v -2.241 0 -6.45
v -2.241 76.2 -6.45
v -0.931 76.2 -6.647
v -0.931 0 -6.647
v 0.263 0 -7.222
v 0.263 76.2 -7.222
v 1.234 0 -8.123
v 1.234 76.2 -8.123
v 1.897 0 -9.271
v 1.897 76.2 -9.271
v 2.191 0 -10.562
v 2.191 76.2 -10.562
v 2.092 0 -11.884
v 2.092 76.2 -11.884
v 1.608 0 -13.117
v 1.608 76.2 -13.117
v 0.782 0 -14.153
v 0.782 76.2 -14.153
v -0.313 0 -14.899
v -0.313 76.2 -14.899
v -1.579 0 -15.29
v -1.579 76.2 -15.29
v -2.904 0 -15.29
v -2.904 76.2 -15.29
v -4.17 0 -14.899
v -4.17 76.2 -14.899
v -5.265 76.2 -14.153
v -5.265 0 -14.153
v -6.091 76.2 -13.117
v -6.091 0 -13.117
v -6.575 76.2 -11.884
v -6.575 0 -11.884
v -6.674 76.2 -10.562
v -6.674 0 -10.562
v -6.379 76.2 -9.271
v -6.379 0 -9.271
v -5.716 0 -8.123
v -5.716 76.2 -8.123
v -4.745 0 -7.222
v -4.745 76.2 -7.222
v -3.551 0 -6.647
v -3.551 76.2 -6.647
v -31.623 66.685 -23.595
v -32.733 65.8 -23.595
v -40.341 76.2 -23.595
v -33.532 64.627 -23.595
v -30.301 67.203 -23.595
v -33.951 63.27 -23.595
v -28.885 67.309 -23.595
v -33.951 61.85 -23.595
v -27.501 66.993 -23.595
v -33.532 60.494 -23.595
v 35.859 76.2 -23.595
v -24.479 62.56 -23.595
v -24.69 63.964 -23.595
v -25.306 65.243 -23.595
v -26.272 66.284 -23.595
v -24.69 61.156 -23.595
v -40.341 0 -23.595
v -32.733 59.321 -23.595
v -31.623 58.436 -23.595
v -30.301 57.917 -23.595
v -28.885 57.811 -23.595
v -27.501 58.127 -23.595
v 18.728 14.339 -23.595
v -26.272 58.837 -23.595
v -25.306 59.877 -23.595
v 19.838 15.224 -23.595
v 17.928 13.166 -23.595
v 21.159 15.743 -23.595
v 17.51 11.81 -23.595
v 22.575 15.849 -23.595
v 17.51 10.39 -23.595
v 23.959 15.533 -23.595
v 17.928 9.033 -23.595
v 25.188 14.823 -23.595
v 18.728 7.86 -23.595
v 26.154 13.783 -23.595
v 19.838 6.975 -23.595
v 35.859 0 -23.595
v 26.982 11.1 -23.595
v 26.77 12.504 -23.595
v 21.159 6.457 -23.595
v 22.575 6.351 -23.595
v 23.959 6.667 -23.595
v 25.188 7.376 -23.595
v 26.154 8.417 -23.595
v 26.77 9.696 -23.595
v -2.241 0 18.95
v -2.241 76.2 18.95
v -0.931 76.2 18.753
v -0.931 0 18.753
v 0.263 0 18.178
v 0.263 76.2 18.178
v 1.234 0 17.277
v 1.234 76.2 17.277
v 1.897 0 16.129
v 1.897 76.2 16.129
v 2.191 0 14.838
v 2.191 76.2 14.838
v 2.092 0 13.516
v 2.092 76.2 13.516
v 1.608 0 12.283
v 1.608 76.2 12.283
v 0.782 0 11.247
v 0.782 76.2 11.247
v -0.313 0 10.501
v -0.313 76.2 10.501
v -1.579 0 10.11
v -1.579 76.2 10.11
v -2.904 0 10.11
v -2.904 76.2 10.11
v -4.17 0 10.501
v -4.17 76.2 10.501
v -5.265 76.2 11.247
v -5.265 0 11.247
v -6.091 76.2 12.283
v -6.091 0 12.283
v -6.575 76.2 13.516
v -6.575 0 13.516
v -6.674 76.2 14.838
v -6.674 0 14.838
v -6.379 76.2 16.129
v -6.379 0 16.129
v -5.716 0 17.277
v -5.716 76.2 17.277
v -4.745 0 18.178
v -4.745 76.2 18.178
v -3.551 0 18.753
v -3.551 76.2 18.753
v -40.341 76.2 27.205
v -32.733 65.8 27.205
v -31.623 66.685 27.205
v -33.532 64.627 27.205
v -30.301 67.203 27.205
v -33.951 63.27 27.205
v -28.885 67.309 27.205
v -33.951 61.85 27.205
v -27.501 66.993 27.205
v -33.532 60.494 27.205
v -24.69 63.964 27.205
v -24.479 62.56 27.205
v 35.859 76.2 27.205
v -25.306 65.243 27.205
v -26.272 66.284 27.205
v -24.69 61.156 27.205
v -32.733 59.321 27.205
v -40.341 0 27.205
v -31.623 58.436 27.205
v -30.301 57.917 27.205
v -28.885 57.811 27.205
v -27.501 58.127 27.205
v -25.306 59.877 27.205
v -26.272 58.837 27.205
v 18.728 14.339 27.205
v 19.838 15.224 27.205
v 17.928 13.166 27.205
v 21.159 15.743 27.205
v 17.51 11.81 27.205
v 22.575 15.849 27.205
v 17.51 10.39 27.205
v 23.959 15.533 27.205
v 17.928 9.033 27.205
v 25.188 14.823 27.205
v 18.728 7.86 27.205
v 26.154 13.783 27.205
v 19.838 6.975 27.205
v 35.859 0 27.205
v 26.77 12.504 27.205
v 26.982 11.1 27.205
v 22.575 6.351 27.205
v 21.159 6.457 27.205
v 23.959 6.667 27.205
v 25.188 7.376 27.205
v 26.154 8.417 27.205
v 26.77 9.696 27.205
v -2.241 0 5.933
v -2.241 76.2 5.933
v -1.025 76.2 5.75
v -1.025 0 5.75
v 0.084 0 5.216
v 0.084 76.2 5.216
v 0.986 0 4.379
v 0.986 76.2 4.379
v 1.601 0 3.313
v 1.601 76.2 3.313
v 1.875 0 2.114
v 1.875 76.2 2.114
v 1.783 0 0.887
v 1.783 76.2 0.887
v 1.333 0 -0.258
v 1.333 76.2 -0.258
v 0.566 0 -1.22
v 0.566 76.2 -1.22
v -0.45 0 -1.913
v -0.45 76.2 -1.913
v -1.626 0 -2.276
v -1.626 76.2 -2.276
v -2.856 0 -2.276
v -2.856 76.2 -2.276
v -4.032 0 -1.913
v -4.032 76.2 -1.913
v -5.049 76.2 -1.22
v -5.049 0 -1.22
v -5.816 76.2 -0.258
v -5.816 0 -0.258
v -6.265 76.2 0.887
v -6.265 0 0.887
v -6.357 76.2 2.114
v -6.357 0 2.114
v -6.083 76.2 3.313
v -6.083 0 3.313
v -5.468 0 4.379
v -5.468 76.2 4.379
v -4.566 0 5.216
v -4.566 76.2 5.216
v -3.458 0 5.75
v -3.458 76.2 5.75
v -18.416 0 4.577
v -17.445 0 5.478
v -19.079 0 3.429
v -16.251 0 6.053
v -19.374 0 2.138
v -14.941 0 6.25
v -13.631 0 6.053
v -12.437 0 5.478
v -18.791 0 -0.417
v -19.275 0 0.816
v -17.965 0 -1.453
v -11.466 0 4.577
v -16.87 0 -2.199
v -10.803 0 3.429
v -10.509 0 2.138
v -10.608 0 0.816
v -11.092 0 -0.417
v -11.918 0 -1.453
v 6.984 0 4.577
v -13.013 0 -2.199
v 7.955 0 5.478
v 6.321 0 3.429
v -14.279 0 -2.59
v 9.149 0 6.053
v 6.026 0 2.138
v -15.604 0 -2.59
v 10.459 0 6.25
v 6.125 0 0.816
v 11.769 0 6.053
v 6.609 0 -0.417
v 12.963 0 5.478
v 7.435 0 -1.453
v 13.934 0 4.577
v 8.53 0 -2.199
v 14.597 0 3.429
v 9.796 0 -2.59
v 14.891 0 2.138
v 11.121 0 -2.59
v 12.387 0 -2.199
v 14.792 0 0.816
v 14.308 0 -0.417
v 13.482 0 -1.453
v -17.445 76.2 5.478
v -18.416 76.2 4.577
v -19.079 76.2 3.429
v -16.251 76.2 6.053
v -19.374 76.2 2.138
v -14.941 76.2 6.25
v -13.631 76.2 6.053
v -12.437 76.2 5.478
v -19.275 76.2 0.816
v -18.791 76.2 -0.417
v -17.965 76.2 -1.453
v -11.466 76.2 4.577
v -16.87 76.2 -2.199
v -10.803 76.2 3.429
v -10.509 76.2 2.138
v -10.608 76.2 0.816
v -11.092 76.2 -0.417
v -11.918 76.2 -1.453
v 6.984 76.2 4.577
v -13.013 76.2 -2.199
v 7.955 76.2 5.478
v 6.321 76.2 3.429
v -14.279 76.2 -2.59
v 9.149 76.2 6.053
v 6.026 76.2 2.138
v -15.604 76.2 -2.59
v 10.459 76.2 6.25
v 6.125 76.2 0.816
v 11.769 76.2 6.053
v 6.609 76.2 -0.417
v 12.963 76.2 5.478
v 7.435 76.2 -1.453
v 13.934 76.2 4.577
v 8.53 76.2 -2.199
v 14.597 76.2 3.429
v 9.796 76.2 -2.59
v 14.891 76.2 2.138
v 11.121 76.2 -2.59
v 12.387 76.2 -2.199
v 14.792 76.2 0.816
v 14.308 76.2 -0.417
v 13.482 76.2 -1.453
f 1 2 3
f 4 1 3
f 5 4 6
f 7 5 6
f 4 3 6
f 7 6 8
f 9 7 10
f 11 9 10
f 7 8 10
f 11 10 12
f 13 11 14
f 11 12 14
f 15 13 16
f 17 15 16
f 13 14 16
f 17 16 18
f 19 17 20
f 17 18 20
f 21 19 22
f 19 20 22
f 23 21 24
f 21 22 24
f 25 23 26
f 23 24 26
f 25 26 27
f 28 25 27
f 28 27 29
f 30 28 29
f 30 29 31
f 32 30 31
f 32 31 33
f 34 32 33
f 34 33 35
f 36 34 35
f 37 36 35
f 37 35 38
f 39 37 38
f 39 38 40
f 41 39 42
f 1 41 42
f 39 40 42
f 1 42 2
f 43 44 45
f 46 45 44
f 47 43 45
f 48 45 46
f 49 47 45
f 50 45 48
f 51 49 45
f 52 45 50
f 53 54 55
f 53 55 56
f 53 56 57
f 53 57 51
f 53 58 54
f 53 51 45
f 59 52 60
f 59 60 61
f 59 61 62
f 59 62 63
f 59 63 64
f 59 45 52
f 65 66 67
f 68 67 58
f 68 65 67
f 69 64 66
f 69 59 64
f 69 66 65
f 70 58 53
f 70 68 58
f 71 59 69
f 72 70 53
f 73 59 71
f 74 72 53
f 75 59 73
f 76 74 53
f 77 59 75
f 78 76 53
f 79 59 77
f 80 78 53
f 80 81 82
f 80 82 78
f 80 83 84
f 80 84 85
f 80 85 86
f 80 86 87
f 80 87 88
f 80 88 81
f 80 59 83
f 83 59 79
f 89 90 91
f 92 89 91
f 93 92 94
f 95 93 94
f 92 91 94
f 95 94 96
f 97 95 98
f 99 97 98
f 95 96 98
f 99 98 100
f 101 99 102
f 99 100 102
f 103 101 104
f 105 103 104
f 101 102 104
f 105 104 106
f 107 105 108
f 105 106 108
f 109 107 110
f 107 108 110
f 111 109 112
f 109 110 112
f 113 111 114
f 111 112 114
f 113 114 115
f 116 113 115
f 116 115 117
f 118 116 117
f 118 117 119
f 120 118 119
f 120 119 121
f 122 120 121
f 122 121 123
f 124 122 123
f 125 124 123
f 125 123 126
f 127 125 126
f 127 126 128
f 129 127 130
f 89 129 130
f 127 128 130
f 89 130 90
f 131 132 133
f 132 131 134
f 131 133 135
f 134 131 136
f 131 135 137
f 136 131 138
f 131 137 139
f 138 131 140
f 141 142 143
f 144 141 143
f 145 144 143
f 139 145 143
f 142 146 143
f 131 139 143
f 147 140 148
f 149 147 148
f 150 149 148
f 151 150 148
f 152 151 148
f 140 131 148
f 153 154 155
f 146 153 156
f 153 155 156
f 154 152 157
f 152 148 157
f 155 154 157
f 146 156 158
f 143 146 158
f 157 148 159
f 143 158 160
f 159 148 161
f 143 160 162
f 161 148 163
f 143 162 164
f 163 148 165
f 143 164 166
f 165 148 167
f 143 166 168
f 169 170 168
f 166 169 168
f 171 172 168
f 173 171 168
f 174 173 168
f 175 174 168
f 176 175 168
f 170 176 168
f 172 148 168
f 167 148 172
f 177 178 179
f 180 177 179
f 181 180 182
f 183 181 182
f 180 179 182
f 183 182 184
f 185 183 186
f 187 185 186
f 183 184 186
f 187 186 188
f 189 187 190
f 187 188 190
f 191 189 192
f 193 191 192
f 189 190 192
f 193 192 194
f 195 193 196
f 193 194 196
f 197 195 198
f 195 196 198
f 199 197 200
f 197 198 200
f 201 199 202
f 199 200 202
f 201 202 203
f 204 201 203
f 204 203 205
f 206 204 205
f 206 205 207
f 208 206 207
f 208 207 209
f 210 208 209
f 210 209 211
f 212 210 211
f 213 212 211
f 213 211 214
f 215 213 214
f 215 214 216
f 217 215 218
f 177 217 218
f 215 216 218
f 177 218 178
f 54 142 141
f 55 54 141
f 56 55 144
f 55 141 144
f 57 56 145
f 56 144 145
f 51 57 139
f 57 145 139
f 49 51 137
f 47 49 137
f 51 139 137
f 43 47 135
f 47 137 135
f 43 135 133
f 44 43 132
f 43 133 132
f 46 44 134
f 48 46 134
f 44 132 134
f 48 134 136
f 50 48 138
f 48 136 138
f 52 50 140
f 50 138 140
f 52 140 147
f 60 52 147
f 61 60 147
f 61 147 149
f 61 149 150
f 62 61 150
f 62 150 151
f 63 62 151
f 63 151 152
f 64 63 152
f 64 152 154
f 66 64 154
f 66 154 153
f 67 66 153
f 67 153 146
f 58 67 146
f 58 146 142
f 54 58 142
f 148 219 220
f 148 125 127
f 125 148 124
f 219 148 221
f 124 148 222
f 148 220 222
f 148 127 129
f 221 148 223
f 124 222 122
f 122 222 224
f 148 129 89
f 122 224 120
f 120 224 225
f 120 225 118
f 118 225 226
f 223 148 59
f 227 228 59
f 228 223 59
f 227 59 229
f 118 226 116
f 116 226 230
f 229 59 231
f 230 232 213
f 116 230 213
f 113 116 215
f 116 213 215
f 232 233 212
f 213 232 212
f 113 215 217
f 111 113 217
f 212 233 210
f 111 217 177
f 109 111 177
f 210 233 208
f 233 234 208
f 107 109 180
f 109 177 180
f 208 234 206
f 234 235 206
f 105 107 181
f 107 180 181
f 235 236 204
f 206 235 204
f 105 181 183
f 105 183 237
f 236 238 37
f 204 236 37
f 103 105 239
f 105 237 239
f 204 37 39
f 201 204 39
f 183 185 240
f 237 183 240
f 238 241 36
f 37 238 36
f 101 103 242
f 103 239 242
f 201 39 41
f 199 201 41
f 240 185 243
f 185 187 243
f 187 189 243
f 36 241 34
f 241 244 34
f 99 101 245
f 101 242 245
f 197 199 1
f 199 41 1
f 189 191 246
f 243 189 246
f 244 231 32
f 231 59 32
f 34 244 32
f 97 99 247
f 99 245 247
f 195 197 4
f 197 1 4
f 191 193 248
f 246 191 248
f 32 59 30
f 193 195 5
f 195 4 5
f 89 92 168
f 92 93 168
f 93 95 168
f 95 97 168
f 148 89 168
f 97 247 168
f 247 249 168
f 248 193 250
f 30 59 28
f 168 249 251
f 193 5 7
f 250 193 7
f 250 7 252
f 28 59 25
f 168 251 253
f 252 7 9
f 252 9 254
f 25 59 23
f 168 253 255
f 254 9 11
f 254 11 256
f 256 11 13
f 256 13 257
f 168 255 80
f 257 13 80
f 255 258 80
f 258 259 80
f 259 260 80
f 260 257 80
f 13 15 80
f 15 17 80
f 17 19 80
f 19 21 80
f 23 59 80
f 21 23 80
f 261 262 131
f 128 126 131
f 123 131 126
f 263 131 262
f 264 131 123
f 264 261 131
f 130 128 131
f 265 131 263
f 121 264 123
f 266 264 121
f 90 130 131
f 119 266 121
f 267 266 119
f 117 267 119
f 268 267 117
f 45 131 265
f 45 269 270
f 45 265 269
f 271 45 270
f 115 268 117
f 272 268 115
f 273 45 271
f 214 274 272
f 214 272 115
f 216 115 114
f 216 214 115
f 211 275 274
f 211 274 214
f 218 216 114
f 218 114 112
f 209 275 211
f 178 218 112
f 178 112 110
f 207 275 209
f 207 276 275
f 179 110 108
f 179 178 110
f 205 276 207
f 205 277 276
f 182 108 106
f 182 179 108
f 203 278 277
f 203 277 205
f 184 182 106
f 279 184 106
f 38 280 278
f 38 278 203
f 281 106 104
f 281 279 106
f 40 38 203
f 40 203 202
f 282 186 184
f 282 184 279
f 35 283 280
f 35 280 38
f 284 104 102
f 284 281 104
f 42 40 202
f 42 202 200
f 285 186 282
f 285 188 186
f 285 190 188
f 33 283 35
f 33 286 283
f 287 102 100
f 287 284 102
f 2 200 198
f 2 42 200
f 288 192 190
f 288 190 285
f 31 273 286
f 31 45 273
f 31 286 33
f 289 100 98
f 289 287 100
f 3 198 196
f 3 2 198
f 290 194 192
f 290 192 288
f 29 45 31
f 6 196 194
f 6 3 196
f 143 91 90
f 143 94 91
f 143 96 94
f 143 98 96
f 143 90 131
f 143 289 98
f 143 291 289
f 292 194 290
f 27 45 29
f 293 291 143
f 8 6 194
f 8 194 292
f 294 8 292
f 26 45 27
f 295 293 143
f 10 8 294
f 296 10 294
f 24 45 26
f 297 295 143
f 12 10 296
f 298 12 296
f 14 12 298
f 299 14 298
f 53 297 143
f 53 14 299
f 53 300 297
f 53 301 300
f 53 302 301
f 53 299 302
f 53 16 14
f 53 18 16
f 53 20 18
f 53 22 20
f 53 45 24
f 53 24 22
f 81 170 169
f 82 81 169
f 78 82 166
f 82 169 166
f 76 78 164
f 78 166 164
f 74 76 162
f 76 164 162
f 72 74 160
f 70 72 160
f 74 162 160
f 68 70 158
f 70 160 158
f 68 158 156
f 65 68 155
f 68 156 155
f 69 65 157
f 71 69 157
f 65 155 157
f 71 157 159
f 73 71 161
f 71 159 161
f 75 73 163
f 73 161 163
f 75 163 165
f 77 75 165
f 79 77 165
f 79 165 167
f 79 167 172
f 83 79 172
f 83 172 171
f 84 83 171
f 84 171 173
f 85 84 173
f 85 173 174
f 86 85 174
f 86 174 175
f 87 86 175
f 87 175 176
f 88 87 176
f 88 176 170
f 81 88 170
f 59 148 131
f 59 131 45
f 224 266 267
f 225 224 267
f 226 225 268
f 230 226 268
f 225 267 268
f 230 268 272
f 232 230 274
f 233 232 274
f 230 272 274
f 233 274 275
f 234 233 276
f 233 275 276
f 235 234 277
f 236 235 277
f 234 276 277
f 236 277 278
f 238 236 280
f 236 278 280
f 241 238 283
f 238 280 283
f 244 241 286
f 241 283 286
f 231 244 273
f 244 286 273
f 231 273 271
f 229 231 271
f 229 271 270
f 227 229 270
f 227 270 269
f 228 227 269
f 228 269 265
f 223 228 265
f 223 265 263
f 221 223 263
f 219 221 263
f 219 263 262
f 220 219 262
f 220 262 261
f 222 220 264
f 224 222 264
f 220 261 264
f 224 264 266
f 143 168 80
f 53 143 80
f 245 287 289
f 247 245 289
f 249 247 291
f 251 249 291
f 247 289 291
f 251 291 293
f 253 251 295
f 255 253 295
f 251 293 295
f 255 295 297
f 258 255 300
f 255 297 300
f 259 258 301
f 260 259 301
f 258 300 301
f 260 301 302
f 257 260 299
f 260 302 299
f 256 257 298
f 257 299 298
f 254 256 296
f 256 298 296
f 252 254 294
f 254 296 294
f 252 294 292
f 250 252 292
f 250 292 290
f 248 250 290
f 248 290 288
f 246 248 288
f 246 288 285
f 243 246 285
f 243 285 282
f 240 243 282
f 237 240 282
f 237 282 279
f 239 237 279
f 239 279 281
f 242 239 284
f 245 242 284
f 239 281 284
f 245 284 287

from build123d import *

# Parameters (mm, degrees)
SKETCH3_W           = 76.2
SKETCH3_H           = 50.8
BOSS_EXTRUDE1_DEPTH = 76.2
SKETCH5_R           = 4.1275
CUT_EXTRUDE1_DEPTH  = 76.2
SKETCH6_R           = 4.445
CUT_EXTRUDE2_DEPTH  = 76.2
SKETCH8_R           = 4.445
CUT_EXTRUDE4_DEPTH  = 76.2
SKETCH9_R           = 4.445
CUT_EXTRUDE5_DEPTH  = 76.2
SKETCH10_R          = 4.445
CUT_EXTRUDE6_DEPTH  = 76.2
SKETCH12_R          = 4.7625
CUT_EXTRUDE7_DEPTH  = 76.2
SKETCH13_R          = 4.7625
CUT_EXTRUDE8_DEPTH  = 76.2


with BuildPart() as part:
    # Sketch3 → Boss-Extrude1 (new body)
    with BuildSketch(Plane(origin=(0, 0, 0), x_dir=(1, 0, 0), z_dir=(0, 1, 0))):
        with Locations((-2.241176471, -1.805392157)):
            Rectangle(SKETCH3_W, SKETCH3_H)
    extrude(amount=BOSS_EXTRUDE1_DEPTH)

    # Sketch5 → Cut-Extrude1 (cut)
    with BuildSketch(Plane(origin=(0, 76.2, 0), x_dir=(1, 0, 0), z_dir=(0, 1, 0))):
        with Locations(Location((-2.241176471, -1.805392157, 0), (0, 0, 270))):
            Circle(SKETCH5_R)
    extrude(amount=-CUT_EXTRUDE1_DEPTH, mode=Mode.SUBTRACT)

    # Sketch6 → Cut-Extrude2 (cut)
    with BuildSketch(Plane(origin=(0, 76.2, 0), x_dir=(1, 0, 0), z_dir=(0, 1, 0))):
        with Locations(Location((-14.941176471, -1.805392157, 0), (0, 0, 270))):
            Circle(SKETCH6_R)
    extrude(amount=-CUT_EXTRUDE2_DEPTH, mode=Mode.SUBTRACT)

    # Sketch8 → Cut-Extrude4 (cut)
    with BuildSketch(Plane(origin=(0, 76.2, 0), x_dir=(1, 0, 0), z_dir=(0, 1, 0))):
        with Locations(Location((10.458823529, -1.805392157, 0), (0, 0, 270))):
            Circle(SKETCH8_R)
    extrude(amount=-CUT_EXTRUDE4_DEPTH, mode=Mode.SUBTRACT)

    # Sketch9 → Cut-Extrude5 (cut)
    with BuildSketch(Plane(origin=(0, 76.2, 0), x_dir=(1, 0, 0), z_dir=(0, 1, 0))):
        with Locations(Location((-2.241176471, -14.505392157, 0), (0, 0, 270))):
            Circle(SKETCH9_R)
    extrude(amount=-CUT_EXTRUDE5_DEPTH, mode=Mode.SUBTRACT)

    # Sketch10 → Cut-Extrude6 (cut)
    with BuildSketch(Plane(origin=(0, 76.2, 0), x_dir=(1, 0, 0), z_dir=(0, 1, 0))):
        with Locations(Location((-2.241176471, 10.894607843, 0), (0, 0, 270))):
            Circle(SKETCH10_R)
    extrude(amount=-CUT_EXTRUDE6_DEPTH, mode=Mode.SUBTRACT)

    # Sketch12 → Cut-Extrude7 (cut)
    with BuildSketch(Plane.XY.offset(27.205392157)):
        with Locations((-29.241376471, 62.5602)):
            Circle(SKETCH12_R)
    extrude(amount=-CUT_EXTRUDE7_DEPTH, mode=Mode.SUBTRACT)

    # Sketch13 → Cut-Extrude8 (cut)
    with BuildSketch(Plane.XY.offset(27.205392157)):
        with Locations((22.219023529, 11.0998)):
            Circle(SKETCH13_R)
    extrude(amount=-CUT_EXTRUDE8_DEPTH, mode=Mode.SUBTRACT)


solid = part.part
